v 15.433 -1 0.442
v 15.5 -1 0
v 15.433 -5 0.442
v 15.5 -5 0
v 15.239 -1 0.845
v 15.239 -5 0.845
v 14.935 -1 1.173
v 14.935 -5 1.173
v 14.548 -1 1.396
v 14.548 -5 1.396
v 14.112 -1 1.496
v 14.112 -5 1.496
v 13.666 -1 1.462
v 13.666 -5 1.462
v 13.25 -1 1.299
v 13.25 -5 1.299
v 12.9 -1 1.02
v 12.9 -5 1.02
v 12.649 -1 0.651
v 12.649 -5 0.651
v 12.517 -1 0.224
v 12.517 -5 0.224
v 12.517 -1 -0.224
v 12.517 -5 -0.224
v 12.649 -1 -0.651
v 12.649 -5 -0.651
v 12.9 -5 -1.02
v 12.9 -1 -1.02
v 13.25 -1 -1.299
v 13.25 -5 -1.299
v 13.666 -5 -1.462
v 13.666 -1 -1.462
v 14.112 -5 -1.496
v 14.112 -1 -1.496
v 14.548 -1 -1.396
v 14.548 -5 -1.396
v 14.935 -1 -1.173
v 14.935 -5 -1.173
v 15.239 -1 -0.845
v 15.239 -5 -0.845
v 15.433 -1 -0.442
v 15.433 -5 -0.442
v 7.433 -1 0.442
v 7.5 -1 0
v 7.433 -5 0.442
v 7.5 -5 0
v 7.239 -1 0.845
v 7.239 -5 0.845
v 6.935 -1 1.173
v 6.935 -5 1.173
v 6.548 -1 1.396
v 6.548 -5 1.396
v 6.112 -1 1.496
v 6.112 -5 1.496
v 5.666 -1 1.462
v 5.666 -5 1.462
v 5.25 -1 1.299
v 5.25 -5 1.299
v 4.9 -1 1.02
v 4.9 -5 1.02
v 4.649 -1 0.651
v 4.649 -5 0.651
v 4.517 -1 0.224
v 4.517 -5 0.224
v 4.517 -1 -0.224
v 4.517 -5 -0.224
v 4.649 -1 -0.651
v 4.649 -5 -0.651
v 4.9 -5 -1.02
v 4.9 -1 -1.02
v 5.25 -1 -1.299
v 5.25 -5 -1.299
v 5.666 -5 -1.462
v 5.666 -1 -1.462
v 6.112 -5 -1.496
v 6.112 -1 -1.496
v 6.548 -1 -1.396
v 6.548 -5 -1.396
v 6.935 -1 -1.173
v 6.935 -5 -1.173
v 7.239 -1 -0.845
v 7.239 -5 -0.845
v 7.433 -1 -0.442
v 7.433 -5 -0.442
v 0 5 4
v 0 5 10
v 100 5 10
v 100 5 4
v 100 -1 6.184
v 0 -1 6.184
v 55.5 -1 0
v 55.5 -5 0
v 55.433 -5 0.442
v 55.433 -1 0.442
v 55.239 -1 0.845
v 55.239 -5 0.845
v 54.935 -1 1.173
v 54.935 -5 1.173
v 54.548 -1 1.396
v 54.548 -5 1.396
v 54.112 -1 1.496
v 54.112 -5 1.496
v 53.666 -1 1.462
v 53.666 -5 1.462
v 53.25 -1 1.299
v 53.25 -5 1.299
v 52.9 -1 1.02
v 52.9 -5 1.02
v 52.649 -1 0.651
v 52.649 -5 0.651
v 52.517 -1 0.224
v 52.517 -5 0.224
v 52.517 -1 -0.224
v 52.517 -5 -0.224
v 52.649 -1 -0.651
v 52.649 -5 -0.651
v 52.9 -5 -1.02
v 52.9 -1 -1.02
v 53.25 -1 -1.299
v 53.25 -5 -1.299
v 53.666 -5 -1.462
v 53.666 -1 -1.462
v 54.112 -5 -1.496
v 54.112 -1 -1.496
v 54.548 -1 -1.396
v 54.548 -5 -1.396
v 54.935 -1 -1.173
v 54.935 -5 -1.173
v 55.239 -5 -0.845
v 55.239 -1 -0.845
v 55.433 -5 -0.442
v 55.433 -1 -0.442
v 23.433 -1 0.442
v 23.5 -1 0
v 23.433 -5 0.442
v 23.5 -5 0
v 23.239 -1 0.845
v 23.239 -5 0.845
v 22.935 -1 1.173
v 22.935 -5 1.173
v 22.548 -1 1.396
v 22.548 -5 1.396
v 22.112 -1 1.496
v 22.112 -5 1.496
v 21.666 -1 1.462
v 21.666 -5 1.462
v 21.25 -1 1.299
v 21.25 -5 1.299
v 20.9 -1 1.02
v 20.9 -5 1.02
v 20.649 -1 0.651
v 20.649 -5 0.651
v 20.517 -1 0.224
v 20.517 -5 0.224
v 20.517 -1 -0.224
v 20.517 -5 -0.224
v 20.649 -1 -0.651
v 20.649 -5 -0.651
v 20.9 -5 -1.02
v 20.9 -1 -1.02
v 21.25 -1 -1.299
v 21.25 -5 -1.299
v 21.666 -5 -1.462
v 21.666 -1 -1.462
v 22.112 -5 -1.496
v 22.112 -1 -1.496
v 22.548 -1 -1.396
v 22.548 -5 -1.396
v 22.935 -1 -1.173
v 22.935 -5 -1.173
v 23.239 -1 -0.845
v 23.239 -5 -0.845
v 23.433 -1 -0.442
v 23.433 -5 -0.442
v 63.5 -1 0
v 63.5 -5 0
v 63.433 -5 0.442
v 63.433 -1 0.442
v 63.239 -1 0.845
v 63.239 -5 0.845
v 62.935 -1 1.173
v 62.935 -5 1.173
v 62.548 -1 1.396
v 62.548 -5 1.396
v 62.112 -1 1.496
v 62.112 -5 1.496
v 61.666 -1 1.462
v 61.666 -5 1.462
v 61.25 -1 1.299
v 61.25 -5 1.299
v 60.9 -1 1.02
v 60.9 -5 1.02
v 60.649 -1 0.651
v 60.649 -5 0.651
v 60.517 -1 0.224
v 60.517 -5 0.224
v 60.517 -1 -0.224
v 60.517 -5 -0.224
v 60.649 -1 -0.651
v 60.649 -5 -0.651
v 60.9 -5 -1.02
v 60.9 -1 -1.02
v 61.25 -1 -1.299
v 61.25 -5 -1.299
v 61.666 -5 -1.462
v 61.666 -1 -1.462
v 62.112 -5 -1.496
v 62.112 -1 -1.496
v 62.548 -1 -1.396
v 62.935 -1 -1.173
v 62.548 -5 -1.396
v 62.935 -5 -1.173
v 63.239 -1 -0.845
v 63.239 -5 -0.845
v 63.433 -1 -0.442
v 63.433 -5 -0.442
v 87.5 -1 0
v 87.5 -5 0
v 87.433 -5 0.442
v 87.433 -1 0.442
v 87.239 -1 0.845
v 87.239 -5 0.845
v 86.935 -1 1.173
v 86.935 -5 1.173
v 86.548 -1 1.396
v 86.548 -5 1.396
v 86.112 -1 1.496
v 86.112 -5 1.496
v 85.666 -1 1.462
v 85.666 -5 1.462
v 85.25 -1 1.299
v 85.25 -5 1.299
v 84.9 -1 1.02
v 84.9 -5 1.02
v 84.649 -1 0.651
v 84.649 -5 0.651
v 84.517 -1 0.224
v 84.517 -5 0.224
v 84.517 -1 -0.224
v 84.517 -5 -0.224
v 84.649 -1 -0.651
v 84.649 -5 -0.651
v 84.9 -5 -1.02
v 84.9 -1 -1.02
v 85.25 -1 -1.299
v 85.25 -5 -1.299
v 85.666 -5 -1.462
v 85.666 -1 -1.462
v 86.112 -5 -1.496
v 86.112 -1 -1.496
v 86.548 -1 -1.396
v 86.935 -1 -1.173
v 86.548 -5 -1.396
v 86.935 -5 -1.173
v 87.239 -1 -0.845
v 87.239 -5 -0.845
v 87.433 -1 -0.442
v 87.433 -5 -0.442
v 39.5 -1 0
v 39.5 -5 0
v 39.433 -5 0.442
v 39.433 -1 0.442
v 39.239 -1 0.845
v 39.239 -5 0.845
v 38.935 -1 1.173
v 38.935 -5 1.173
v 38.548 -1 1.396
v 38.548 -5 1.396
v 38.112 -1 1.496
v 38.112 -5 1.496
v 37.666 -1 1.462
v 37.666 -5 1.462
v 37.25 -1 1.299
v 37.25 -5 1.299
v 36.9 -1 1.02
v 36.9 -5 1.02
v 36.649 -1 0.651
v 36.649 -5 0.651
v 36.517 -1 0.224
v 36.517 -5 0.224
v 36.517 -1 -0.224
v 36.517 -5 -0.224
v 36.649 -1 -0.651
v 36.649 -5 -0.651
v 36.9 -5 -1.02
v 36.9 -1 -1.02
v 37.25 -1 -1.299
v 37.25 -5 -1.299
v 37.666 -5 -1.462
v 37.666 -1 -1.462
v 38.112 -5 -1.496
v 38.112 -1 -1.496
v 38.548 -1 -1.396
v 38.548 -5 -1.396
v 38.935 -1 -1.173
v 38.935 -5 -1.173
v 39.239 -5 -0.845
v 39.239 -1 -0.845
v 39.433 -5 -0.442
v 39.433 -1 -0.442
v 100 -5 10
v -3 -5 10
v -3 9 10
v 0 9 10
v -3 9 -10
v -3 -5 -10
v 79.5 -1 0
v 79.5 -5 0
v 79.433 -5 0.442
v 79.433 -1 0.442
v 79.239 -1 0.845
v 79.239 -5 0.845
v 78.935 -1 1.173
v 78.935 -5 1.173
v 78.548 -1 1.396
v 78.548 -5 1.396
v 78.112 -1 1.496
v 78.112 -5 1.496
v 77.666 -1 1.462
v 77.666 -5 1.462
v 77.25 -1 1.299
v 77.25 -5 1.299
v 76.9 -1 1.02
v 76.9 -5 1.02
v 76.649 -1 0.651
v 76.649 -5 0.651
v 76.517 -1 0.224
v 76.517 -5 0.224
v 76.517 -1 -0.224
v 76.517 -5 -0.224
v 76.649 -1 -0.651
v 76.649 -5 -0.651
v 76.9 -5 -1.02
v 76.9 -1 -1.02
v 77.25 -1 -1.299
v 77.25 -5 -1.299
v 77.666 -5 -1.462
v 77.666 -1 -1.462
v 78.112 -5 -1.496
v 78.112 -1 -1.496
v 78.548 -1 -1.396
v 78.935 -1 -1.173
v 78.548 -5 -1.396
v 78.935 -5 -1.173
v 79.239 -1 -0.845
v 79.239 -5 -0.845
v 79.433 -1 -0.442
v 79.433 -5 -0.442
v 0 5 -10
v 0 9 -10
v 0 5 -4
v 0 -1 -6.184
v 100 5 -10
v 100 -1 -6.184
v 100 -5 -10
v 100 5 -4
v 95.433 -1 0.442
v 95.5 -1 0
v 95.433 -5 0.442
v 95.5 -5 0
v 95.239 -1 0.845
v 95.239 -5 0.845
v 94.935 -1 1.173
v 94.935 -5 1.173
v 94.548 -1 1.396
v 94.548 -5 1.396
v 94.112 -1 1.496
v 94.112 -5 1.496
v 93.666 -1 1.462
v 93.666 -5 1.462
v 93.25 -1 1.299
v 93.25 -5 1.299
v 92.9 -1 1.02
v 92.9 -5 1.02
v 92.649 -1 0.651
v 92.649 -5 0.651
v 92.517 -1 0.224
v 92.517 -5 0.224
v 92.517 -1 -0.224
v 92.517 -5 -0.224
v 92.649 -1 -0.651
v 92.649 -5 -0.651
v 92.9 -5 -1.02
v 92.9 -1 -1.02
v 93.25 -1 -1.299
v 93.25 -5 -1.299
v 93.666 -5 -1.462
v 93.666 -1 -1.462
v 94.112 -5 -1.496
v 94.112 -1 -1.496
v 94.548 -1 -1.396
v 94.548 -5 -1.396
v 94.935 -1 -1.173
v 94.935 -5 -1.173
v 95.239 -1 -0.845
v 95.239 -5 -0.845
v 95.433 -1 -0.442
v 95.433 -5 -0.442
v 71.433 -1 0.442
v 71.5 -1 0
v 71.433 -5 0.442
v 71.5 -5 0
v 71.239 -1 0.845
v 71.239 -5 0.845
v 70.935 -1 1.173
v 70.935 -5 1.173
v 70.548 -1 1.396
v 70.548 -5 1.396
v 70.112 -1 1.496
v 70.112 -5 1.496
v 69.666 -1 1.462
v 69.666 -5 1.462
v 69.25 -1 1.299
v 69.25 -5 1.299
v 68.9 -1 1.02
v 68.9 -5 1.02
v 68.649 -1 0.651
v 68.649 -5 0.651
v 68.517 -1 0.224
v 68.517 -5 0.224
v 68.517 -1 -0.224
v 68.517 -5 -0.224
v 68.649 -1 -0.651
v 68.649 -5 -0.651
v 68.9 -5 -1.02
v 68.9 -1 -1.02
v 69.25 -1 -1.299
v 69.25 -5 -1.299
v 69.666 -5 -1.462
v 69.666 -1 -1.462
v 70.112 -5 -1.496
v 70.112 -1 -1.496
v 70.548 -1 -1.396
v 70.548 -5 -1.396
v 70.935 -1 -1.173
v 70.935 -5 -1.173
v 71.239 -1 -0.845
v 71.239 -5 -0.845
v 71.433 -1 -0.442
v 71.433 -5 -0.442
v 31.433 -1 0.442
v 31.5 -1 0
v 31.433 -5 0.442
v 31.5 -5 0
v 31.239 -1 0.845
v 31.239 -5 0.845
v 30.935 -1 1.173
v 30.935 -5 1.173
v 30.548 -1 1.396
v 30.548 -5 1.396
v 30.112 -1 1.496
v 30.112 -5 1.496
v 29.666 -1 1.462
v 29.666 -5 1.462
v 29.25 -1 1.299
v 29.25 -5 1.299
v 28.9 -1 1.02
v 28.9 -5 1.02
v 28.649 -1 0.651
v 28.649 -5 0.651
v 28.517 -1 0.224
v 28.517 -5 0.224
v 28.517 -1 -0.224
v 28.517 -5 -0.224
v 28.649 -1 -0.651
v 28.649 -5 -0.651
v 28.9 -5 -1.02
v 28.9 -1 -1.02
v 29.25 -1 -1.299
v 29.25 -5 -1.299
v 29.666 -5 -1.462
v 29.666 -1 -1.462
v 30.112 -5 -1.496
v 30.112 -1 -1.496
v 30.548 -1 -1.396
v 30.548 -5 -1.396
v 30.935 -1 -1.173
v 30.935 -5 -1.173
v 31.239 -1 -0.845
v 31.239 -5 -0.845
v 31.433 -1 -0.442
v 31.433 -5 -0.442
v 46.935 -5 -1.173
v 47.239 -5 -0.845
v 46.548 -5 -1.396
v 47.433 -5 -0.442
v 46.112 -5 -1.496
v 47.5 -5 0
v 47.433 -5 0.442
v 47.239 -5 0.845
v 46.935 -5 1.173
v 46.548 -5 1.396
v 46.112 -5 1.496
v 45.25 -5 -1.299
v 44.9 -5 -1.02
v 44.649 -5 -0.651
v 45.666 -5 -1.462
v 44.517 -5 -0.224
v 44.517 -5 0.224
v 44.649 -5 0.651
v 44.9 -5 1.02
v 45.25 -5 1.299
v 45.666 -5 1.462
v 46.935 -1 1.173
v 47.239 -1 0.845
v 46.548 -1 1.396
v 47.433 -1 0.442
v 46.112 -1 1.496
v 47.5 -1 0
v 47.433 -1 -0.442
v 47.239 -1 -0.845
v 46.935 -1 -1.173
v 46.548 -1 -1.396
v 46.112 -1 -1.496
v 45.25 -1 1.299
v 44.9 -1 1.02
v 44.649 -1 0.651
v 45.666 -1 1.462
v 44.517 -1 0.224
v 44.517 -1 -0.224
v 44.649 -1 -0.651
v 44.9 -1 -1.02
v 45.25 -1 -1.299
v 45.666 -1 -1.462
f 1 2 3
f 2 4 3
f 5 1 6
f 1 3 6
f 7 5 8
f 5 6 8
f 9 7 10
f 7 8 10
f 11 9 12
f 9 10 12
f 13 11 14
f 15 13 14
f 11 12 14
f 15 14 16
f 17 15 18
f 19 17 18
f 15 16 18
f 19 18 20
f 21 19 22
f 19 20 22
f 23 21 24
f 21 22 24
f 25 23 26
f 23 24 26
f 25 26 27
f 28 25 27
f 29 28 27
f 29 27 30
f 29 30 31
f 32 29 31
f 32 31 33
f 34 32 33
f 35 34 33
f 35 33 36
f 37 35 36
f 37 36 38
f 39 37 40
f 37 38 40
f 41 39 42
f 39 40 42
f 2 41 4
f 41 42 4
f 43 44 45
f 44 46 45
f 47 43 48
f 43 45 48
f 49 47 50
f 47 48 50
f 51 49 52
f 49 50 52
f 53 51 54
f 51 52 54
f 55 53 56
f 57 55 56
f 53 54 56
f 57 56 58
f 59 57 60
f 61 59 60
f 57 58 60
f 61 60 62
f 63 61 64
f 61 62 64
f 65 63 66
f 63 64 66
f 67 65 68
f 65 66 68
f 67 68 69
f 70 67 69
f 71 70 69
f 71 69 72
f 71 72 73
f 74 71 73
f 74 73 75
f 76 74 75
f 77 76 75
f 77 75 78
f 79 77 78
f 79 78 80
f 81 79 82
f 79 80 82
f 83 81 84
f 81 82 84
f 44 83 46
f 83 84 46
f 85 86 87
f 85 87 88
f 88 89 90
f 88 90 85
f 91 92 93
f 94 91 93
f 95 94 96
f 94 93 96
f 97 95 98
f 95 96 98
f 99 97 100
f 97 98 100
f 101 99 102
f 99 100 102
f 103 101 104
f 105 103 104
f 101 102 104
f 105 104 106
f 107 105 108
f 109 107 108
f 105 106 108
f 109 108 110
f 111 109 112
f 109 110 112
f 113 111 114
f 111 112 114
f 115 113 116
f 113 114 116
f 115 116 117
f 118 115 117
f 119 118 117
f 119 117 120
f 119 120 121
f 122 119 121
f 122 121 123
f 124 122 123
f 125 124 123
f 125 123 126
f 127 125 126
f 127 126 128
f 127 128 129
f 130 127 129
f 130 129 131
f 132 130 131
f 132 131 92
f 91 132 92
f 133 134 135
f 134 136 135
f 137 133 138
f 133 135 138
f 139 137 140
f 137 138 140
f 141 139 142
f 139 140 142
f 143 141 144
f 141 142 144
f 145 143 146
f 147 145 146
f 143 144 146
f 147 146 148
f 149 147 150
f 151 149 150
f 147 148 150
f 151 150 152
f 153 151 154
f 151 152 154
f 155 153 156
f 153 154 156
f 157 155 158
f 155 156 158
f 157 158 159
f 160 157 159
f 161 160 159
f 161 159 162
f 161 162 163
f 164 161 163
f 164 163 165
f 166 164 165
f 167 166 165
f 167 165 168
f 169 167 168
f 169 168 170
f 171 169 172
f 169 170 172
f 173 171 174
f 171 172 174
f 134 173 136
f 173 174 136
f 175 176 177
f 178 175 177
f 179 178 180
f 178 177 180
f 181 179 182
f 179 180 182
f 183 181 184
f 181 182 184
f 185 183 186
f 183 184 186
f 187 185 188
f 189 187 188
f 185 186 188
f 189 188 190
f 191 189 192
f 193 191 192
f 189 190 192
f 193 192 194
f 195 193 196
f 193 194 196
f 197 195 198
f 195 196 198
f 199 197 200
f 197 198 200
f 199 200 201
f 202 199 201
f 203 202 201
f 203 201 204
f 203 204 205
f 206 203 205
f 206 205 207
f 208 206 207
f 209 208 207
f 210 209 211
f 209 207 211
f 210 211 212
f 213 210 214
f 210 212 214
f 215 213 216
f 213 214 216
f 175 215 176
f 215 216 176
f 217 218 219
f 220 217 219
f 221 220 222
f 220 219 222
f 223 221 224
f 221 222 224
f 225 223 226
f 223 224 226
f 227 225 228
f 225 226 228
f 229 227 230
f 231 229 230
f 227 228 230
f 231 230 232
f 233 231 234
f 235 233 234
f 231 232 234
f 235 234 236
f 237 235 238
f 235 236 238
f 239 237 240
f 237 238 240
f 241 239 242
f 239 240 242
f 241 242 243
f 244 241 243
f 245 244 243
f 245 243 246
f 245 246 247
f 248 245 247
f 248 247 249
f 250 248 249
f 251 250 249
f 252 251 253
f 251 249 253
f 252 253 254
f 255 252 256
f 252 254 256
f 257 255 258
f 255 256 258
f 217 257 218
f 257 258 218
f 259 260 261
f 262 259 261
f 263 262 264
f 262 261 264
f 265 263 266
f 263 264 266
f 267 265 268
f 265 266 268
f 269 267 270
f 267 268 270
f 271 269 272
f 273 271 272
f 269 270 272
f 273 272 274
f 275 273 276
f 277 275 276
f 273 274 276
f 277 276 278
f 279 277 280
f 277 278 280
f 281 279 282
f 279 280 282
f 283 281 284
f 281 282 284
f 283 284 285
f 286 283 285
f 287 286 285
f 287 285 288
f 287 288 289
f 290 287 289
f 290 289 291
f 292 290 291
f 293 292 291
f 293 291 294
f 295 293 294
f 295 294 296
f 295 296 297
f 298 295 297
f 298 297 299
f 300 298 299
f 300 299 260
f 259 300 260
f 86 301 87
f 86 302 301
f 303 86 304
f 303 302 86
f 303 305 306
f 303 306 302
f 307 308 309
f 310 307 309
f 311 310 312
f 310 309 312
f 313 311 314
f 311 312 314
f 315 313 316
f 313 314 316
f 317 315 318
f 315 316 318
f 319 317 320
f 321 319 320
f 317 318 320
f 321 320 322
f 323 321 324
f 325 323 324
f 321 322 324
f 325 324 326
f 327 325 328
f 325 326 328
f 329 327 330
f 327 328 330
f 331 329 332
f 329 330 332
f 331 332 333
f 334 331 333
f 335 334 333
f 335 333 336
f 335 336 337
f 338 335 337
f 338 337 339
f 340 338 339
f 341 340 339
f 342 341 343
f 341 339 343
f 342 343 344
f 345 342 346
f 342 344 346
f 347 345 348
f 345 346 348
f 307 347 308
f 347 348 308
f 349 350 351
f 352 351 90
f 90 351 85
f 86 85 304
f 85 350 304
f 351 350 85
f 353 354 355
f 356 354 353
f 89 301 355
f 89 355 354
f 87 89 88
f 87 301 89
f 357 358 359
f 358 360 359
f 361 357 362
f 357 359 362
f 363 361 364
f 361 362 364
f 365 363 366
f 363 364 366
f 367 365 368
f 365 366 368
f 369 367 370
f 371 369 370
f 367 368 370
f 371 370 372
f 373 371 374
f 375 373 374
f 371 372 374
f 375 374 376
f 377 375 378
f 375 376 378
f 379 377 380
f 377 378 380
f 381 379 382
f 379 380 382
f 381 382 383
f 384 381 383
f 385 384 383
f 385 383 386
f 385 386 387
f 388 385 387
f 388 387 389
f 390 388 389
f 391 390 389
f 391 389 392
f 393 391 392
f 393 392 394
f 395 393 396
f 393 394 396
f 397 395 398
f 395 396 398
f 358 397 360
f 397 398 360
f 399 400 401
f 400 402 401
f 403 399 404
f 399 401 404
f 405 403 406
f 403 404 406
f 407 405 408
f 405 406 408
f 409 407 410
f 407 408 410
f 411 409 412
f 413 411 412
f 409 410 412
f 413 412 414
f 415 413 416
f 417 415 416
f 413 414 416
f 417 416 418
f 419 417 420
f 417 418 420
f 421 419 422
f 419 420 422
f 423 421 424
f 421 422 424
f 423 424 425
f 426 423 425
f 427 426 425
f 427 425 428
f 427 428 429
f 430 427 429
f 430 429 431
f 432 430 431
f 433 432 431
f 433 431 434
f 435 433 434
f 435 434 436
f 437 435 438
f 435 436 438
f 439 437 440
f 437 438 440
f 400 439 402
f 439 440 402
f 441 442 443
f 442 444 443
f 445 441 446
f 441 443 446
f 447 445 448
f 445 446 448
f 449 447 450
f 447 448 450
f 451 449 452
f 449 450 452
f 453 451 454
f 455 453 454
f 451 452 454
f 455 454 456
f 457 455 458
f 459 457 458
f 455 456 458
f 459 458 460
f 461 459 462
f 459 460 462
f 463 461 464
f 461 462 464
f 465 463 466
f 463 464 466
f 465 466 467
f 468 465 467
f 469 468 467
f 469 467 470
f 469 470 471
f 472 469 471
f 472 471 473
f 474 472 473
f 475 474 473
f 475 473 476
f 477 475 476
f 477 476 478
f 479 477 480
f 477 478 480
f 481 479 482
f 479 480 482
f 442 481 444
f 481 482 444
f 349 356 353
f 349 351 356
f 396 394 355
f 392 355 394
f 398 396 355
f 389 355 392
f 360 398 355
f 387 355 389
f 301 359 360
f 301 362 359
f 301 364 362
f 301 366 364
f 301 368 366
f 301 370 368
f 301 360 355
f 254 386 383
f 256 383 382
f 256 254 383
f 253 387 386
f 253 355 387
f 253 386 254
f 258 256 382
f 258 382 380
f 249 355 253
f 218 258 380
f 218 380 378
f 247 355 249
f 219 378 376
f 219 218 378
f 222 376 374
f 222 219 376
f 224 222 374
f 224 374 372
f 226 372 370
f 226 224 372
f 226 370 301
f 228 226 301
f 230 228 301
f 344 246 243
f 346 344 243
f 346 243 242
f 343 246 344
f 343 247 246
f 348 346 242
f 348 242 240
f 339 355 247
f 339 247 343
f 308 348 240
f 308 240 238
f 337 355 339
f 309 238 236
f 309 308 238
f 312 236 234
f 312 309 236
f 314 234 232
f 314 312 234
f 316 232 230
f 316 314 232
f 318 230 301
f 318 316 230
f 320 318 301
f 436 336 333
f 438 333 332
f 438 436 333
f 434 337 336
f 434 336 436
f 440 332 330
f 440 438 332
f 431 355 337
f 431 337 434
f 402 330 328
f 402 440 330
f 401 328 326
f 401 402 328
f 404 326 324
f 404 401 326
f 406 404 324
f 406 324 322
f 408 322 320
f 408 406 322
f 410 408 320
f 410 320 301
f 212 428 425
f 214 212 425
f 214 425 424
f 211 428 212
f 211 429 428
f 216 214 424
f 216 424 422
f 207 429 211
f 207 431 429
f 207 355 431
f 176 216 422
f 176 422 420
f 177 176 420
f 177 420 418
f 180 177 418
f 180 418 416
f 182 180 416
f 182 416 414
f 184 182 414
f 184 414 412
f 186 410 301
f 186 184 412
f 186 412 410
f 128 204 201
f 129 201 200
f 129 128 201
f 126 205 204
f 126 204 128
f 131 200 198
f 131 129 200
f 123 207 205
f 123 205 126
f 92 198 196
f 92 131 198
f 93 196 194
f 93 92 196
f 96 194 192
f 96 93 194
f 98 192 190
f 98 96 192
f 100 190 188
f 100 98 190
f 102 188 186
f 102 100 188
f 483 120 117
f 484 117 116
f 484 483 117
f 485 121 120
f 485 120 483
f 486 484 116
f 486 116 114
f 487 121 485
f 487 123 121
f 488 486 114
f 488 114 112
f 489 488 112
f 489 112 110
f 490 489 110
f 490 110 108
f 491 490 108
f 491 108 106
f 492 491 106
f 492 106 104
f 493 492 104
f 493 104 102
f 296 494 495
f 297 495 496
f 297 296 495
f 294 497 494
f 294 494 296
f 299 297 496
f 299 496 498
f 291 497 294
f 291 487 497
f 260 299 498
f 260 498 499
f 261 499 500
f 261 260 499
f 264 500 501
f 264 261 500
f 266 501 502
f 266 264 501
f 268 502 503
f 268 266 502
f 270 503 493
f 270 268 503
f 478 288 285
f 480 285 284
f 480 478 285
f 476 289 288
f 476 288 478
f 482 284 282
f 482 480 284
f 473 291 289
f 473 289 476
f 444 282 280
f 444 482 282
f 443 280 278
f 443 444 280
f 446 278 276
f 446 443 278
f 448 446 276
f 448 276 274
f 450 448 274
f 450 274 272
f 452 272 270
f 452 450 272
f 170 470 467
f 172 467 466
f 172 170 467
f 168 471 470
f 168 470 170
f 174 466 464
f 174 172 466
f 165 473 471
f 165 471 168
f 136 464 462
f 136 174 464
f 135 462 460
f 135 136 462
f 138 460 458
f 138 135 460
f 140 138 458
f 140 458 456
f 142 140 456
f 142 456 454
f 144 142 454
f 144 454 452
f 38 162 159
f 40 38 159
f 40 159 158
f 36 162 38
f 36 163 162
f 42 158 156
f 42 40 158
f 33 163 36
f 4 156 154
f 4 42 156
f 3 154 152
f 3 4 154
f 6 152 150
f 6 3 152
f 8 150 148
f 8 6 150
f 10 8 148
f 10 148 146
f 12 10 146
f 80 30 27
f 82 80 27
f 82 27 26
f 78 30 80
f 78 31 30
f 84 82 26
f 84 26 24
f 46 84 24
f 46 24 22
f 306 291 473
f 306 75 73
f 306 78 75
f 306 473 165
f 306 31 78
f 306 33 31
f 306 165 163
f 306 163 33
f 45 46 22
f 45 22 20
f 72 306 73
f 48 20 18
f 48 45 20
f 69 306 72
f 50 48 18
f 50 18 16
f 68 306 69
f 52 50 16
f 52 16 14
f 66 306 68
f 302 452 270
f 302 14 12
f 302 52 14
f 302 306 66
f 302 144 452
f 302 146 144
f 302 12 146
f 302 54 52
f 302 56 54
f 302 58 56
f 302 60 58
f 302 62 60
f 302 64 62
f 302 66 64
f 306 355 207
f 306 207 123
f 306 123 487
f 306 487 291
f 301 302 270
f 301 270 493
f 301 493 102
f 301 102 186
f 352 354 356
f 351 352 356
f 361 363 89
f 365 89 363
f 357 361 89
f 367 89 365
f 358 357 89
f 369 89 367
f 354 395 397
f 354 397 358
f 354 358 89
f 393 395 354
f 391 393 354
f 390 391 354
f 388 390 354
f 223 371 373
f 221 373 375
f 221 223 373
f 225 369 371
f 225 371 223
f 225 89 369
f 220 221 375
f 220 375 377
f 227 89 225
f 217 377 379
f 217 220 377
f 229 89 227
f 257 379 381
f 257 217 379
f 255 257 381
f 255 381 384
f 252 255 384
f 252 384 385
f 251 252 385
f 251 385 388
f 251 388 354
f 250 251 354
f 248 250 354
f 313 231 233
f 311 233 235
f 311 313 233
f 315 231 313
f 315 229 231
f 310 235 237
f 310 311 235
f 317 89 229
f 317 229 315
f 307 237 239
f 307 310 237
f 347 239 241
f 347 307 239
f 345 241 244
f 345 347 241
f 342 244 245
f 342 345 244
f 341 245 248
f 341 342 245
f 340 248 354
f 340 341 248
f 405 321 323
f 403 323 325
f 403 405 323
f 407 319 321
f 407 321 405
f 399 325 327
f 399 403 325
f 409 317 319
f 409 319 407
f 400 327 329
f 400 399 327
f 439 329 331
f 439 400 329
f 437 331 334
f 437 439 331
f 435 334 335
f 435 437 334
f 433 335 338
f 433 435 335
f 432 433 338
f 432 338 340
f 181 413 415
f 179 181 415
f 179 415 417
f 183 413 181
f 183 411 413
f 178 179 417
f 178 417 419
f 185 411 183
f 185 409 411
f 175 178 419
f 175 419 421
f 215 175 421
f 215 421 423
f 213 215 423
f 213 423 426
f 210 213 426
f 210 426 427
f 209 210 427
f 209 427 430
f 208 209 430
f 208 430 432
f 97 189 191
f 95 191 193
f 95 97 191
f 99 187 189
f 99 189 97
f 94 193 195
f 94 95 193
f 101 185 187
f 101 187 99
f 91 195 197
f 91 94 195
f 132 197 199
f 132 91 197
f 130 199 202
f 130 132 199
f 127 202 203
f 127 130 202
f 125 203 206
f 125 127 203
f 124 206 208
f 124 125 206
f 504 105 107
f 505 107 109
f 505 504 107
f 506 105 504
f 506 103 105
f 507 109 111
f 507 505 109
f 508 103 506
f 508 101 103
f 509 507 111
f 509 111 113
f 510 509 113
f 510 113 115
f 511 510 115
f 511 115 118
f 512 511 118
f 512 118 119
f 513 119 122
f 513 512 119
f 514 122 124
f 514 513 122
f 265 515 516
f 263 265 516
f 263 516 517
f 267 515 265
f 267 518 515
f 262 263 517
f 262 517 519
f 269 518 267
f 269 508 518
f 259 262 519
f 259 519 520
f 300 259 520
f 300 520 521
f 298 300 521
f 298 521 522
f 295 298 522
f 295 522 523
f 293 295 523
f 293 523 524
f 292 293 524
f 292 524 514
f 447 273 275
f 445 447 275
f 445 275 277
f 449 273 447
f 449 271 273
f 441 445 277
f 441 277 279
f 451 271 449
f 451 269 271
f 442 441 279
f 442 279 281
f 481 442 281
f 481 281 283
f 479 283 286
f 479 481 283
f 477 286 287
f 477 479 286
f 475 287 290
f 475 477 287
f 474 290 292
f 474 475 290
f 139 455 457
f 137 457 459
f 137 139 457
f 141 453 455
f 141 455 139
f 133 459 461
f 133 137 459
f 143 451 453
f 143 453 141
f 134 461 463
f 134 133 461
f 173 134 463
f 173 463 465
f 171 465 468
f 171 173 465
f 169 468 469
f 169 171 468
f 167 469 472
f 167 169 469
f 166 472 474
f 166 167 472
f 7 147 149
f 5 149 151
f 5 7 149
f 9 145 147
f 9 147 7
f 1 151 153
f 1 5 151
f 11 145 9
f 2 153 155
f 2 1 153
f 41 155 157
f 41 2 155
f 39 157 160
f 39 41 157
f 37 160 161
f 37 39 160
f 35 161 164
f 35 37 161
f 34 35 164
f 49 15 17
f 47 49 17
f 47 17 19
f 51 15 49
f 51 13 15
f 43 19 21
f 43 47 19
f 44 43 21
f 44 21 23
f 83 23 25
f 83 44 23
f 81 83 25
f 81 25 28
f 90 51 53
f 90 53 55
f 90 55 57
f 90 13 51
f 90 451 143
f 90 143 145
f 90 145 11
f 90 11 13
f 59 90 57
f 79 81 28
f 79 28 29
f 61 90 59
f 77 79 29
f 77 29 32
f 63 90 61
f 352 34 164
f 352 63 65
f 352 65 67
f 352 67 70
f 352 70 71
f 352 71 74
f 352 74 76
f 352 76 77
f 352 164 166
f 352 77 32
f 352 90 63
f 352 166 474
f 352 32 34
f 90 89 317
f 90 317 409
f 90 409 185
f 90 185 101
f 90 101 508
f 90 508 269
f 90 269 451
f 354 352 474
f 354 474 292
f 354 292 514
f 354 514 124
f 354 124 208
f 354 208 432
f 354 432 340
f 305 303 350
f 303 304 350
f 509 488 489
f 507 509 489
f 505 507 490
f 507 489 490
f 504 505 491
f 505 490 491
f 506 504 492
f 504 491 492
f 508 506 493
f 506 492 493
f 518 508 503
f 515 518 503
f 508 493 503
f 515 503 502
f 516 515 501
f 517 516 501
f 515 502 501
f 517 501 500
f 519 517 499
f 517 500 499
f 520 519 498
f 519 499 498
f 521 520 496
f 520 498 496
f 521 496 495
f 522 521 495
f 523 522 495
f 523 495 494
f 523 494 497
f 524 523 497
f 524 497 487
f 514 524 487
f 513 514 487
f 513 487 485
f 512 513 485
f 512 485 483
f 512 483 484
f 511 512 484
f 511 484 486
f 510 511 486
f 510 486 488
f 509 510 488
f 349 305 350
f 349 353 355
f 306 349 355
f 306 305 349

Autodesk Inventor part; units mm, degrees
ref_plane "YZ Plane" through (0, 0, 0) normal (1, 0, 0) x (0, 1, 0)
ref_plane "XZ Plane" through (0, 0, 0) normal (0, 1, 0) x (-1, 0, 0)
ref_plane "XY Plane" through (0, 0, 0) normal (0, 0, 1) x (1, 0, 0)
sketch "Sketch1" plane through (0, 0, 0) normal (1, 0, 0) x (0, 1, 0)
  line L0 (-5, 10) -> (5, 10)
  line L1 (5, 10) -> (5, -10)
  line L2 (5, -10) -> (-5, -10)
  line L3 (-5, -10) -> (-5, 10)
  line L4 (-5, 10) -> (5, -10) construction
  line L5 (5, 10) -> (-5, -10) construction
  line L6 (-1, 6.1838) -> (-1, -6.1838)
  line L7 (-1, -6.1838) -> (5, -4)
  line L8 (-1, 6.1838) -> (5, 4)
  point P0 (0, 0)
  dimension "d0" = 10
  dimension "d1" = 20
  dimension "d3" = 110
  dimension "d4" = 110
  dimension "d5" = 6
  dimension "d6" = 6
  dimension "d7" = 6
  dimension "d8" = 6
extrude "Extrusion1" add sketch "Sketch1" along normal blind 100 contours L0 L1 L8 L6 L7 L2 L3
sketch "Sketch2" plane through (0, 0, 0) normal (-1, 0, 0) x (0, 0, 1)
  line L0 (-10, -5) -> (-10, 5) projected
  line L1 (-10, -5) -> (10, -5)
  line L2 (10, -5) -> (10, 9)
  line L3 (10, 9) -> (-10, 9)
  line L4 (-10, 9) -> (-10, -5)
  point P0 (0, 0)
  dimension "d11" = 20
  dimension "d12" = 14
extrude "Extrusion2" add sketch "Sketch2" along normal blind 3
sketch "Sketch3" plane through (100, -5, -10) normal (0, -1, 0) x (1, 0, 0)
  circle A0 centre (-6, 10) radius 1.5 projected
  circle A1 centre (-14, 10) radius 1.5 projected
  circle A2 centre (-22, 10) radius 1.5 projected
  circle A3 centre (-30, 10) radius 1.5 projected
  circle A4 centre (-38, 10) radius 1.5 projected
  circle A5 centre (-46, 10) radius 1.5 projected
  circle A6 centre (-54, 10) radius 1.5 projected
  line L0 (-103, 0) -> (0, 0) projected
  line L1 (0, 20) -> (0, 0) projected
  line L2 (0, 20) -> (-103, 20) projected
  line L3 (-103, 0) -> (-103, 20) projected
  circle A7 centre (-62, 10) radius 1.5 projected
  circle A8 centre (-70, 10) radius 1.5 projected
  circle A9 centre (-78, 10) radius 1.5 projected
  circle A10 centre (-86, 10) radius 1.5 projected
  circle A11 centre (-94, 10) radius 1.5 projected
  point P0 (-100, 10)
extrude "Extrusion3" cut sketch "Sketch3" against normal through all contours A0 | A1 | A2 | A3 | A4 | A5 | A6 | A7 | A8 | A9 | A10 | A11
properties part number "prismatic link inner"
